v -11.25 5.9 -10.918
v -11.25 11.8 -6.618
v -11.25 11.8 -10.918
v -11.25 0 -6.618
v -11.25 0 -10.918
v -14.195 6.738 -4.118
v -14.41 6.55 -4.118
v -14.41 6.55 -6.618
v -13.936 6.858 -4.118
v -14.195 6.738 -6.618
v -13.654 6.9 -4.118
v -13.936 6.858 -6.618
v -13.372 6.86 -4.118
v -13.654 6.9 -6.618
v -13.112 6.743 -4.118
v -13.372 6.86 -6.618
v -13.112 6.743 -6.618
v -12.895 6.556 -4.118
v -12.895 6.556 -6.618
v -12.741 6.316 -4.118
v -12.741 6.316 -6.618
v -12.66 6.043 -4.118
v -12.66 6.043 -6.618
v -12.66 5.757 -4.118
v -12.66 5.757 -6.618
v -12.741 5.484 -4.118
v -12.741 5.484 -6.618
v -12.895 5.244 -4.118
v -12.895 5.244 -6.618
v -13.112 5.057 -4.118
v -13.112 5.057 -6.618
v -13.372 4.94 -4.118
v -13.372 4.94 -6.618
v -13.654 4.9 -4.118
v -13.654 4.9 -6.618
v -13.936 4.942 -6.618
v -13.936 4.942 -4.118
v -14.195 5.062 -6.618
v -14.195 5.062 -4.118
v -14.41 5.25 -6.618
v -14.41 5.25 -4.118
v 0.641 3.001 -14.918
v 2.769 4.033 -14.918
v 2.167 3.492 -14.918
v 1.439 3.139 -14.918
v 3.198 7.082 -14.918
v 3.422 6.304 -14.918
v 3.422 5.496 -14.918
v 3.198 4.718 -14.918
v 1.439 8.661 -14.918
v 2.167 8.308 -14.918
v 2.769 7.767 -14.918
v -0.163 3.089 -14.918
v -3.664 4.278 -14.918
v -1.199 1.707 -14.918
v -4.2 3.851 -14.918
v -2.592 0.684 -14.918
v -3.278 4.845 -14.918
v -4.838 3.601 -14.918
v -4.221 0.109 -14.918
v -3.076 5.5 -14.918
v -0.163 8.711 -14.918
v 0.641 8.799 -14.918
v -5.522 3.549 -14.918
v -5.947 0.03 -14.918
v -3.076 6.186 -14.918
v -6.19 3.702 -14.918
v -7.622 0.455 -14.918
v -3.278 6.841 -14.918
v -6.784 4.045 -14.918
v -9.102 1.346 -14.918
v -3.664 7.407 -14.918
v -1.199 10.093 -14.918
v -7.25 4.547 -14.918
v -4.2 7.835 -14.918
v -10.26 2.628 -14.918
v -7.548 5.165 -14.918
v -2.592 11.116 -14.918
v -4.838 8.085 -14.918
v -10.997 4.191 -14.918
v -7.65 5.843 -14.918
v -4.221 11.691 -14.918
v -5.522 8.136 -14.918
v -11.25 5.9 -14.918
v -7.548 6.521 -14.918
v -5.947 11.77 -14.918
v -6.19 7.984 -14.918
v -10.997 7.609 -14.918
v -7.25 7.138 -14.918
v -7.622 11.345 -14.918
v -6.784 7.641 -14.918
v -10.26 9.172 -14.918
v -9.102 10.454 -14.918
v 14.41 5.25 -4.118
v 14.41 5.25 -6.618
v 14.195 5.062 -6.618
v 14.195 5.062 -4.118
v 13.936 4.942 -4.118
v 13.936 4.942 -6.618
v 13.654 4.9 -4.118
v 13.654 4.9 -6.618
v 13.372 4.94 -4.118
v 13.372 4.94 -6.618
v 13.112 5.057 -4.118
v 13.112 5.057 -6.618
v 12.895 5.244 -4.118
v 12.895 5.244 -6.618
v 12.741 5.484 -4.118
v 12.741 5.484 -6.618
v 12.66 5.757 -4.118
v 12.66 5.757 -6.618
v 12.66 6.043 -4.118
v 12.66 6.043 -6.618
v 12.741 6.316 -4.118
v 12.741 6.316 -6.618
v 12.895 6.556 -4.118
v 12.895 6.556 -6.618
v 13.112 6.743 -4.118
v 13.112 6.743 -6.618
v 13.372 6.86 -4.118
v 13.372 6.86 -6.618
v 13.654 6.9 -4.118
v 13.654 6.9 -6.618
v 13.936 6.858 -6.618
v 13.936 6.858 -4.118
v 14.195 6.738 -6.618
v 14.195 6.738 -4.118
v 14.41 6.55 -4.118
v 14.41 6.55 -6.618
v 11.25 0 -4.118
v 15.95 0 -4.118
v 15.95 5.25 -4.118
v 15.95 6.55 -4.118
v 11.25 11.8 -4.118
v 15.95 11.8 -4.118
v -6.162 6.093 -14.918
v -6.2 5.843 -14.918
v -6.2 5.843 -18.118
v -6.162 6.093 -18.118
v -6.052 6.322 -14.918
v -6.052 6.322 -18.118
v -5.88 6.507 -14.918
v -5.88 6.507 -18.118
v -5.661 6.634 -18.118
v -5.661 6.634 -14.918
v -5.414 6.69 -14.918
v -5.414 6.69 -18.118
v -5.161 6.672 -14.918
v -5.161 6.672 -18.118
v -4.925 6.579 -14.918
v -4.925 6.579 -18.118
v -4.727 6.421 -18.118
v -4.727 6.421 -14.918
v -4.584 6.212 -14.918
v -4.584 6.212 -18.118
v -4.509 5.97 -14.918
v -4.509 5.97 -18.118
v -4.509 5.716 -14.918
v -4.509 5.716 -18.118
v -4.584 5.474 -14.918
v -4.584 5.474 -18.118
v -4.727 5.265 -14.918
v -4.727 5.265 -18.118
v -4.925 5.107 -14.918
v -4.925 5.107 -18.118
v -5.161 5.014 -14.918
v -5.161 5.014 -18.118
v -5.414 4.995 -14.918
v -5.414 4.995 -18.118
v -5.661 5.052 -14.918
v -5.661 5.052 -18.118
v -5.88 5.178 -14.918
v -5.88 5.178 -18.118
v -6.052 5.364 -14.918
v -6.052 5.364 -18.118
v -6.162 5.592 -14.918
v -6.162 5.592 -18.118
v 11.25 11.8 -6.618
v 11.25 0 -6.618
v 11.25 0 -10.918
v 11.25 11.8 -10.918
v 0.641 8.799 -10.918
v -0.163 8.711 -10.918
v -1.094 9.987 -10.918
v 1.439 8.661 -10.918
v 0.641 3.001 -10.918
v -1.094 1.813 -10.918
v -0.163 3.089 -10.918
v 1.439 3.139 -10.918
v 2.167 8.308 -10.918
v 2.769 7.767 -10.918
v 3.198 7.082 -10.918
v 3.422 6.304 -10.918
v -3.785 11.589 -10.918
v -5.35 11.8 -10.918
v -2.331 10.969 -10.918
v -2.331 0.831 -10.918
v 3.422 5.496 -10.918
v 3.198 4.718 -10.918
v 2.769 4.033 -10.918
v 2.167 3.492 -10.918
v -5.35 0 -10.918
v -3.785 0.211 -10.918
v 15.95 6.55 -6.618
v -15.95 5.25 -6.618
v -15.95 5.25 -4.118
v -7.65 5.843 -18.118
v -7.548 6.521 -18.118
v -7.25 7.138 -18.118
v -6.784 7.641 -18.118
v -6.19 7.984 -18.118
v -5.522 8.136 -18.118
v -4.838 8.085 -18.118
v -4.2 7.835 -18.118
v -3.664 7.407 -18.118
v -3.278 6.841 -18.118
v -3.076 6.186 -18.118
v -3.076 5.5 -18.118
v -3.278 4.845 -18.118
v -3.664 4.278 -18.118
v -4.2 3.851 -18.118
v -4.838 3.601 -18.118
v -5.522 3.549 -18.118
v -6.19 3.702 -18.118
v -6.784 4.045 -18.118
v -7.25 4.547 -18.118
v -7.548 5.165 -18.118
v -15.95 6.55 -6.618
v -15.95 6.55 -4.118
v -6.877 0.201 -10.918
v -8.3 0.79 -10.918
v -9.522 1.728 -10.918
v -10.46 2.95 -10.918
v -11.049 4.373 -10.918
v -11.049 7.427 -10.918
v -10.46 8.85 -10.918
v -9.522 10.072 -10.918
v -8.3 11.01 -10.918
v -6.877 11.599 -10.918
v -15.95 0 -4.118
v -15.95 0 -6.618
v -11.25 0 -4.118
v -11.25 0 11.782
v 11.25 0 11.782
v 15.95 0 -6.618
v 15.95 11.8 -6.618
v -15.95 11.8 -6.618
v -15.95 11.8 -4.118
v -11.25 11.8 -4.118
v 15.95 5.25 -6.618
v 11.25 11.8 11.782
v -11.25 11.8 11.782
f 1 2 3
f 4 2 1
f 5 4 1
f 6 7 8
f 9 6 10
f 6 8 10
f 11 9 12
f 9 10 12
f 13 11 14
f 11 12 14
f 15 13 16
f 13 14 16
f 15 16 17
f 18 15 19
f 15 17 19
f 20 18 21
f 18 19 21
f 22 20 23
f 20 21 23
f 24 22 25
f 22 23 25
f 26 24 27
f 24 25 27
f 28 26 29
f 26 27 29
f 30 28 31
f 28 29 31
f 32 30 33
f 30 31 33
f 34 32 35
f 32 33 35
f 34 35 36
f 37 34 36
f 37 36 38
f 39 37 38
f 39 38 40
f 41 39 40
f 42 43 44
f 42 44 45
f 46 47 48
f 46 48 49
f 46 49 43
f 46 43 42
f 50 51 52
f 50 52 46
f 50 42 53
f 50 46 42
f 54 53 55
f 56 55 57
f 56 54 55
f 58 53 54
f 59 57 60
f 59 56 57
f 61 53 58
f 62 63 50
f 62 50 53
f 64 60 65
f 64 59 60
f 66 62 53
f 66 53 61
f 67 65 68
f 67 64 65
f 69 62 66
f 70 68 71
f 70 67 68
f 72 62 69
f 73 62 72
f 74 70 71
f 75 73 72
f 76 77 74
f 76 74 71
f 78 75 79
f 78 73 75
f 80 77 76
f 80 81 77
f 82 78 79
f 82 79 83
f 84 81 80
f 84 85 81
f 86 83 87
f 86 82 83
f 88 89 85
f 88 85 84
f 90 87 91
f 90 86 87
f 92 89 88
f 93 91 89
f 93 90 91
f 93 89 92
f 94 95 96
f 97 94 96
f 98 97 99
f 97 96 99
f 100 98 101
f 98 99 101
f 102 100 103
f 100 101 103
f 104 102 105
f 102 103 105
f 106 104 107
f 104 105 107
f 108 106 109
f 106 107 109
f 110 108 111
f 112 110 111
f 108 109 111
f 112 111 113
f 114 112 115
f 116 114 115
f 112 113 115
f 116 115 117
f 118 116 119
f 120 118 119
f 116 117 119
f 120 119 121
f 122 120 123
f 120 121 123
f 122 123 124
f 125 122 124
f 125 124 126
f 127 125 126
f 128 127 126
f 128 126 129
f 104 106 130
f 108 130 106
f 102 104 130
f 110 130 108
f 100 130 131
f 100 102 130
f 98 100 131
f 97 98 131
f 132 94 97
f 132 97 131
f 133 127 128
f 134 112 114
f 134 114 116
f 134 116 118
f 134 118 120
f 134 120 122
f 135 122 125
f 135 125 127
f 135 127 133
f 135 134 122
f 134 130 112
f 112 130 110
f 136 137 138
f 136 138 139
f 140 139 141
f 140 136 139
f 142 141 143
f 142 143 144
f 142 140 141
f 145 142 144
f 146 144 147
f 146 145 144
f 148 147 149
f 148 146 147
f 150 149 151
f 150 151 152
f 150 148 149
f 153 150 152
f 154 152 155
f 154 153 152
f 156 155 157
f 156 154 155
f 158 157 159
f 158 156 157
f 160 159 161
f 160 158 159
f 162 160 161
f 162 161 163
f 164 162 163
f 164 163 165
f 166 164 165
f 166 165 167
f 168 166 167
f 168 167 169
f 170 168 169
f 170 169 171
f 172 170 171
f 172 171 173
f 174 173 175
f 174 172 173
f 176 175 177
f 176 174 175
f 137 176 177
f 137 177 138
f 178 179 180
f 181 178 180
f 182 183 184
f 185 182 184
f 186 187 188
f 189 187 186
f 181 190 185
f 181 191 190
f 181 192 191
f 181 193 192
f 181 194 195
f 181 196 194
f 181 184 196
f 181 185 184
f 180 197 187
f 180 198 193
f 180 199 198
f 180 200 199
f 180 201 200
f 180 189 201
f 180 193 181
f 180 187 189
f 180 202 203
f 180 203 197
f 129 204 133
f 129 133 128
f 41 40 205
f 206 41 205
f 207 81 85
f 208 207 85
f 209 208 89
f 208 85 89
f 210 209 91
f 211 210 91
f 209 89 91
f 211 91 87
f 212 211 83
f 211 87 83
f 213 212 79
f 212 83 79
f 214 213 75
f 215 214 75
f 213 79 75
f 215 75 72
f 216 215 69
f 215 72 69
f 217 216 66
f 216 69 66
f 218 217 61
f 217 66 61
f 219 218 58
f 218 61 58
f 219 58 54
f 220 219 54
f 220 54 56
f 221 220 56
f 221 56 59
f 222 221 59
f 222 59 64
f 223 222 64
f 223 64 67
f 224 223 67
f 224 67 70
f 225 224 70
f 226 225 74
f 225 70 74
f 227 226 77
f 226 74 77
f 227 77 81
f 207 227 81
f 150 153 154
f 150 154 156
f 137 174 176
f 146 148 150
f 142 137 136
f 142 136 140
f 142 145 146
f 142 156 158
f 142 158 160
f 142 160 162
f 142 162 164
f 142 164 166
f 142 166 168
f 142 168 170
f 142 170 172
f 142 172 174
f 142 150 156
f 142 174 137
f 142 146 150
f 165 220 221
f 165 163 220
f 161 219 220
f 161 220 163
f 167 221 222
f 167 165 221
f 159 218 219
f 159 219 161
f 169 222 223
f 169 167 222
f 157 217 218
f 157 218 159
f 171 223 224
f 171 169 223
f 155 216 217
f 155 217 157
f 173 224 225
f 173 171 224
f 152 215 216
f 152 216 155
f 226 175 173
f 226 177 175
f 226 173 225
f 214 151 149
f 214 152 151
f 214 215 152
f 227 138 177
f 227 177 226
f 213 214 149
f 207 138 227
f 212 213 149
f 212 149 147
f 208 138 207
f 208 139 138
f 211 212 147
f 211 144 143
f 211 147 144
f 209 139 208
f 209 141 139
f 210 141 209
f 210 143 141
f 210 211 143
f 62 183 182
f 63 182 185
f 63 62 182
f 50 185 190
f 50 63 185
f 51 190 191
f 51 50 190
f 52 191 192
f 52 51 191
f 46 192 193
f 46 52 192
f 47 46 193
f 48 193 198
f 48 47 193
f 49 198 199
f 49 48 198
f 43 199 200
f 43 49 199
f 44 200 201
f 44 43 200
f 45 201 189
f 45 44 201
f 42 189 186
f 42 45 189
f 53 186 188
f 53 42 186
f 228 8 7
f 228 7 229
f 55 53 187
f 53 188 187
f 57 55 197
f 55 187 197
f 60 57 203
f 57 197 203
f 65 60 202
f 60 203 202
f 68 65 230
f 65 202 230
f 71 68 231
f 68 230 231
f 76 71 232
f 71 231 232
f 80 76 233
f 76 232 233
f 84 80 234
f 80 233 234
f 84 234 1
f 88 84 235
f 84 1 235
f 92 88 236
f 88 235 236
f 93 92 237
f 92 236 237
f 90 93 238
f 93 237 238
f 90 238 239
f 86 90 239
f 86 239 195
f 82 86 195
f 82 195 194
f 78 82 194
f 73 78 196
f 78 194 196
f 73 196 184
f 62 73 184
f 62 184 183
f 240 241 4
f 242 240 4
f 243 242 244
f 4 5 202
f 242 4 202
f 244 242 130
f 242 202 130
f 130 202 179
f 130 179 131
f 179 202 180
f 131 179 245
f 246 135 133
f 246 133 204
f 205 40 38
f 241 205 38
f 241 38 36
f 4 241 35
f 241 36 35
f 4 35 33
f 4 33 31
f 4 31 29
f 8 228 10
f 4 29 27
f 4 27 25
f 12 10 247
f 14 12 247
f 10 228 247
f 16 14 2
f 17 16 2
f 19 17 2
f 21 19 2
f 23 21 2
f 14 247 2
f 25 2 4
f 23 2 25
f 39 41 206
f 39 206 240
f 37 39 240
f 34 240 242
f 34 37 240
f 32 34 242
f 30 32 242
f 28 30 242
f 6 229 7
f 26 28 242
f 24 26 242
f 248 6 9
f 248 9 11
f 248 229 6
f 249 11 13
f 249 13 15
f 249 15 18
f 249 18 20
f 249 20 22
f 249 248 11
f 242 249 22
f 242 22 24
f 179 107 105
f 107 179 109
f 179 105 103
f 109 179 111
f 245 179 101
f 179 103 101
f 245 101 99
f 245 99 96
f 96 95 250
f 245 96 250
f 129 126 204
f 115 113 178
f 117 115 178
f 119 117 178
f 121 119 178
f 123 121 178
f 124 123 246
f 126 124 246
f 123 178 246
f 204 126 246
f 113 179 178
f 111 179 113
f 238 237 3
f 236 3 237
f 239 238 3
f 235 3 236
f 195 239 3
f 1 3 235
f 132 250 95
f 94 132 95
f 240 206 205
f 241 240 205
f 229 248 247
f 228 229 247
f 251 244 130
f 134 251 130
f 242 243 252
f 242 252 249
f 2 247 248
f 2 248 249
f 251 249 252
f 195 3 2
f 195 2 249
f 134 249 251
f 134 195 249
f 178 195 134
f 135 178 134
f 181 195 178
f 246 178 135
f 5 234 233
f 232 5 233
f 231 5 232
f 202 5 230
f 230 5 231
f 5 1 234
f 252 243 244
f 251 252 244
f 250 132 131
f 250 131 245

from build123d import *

# Parameters (mm, degrees)
SKETCH1_W           = 22.5
SKETCH1_H           = 22.7
BOSS_EXTRUDE1_DEPTH = 11.8
SKETCH2_W           = 4.7
SKETCH2_H           = 2.5
BOSS_EXTRUDE2_DEPTH = 11.8
SKETCH3_W           = 4.7
SKETCH3_H           = 2.5
BOSS_EXTRUDE3_DEPTH = 11.8
SKETCH4_R           = 5.9
BOSS_EXTRUDE4_DEPTH = 4
SKETCH5_R           = 2.9
BOSS_EXTRUDE5_DEPTH = 4
SKETCH6_R           = 1
SKETCH6_W           = 2.3
SKETCH6_H           = 1.3
CUT_EXTRUDE5_DEPTH  = 28.059240566
SKETCH8_R           = 1
SKETCH8_W           = 2.3
SKETCH8_H           = 1.3
CUT_EXTRUDE7_DEPTH  = 28.059240566
SKETCH9_R           = 2.3
SKETCH9_R_2         = 0.85
BOSS_EXTRUDE7_DEPTH = 3.2


with BuildPart() as part:
    # Sketch1 → Boss-Extrude1 (new body)
    with BuildSketch(Plane(origin=(0, 0, 0), x_dir=(1, 0, 0), z_dir=(0, 1, 0))):
        with Locations((0, -0.432106599)):
            Rectangle(SKETCH1_W, SKETCH1_H)
    extrude(amount=BOSS_EXTRUDE1_DEPTH)

    # Sketch2 → Boss-Extrude2 (add)
    with BuildSketch(Plane(origin=(0, 11.8, 0), x_dir=(1, 0, 0), z_dir=(0, 1, 0))):
        with Locations((13.6, 5.367893401)):
            Rectangle(SKETCH2_W, SKETCH2_H)
    extrude(amount=-BOSS_EXTRUDE2_DEPTH)

    # Sketch3 → Boss-Extrude3 (add)
    with BuildSketch(Plane(origin=(0, 11.8, 0), x_dir=(1, 0, 0), z_dir=(0, 1, 0))):
        with Locations((-13.6, 5.367893401)):
            Rectangle(SKETCH3_W, SKETCH3_H)
    extrude(amount=-BOSS_EXTRUDE3_DEPTH)

    # Sketch4 → Boss-Extrude4 (add)
    with BuildSketch(Plane(origin=(0, 0, -10.917893401), x_dir=(-1, 0, 0), z_dir=(0, 0, -1))):
        with Locations((5.35, 5.9)):
            Circle(SKETCH4_R)
    extrude(amount=BOSS_EXTRUDE4_DEPTH)

    # Sketch5 → Boss-Extrude5 (add)
    with BuildSketch(Plane(origin=(0, 0, -14.917893401), x_dir=(-1, 0, 0), z_dir=(0, 0, -1))):
        with Locations((-0.55, 5.9)):
            Circle(SKETCH5_R)
    extrude(amount=-BOSS_EXTRUDE5_DEPTH)

    # Sketch6 → Cut-Extrude5 (cut, through all)
    with BuildSketch(Plane(origin=(0, 0, -6.617893401), x_dir=(-1, 0, 0), z_dir=(0, 0, -1))):
        with Locations((-13.65, 5.9)):
            Circle(SKETCH6_R)
        with Locations((-14.8, 5.9)):
            Rectangle(SKETCH6_W, SKETCH6_H)
    extrude(amount=-CUT_EXTRUDE5_DEPTH, mode=Mode.SUBTRACT)

    # Sketch8 → Cut-Extrude7 (cut, through all)
    with BuildSketch(Plane(origin=(0, 0, -6.617893401), x_dir=(-1, 0, 0), z_dir=(0, 0, -1))):
        with Locations((13.65, 5.9)):
            Circle(SKETCH8_R)
        with Locations((14.8, 5.9)):
            Rectangle(SKETCH8_W, SKETCH8_H)
    extrude(amount=-CUT_EXTRUDE7_DEPTH, mode=Mode.SUBTRACT)

    # Sketch9 → Boss-Extrude7 (add)
    with BuildSketch(Plane(origin=(0, 0, -14.917893401), x_dir=(-1, 0, 0), z_dir=(0, 0, -1))):
        with Locations((5.35, 5.842855954)):
            Circle(SKETCH9_R)
        with Locations((5.35, 5.842855954)):
            Circle(SKETCH9_R_2, mode=Mode.SUBTRACT)
    extrude(amount=BOSS_EXTRUDE7_DEPTH)


solid = part.part
